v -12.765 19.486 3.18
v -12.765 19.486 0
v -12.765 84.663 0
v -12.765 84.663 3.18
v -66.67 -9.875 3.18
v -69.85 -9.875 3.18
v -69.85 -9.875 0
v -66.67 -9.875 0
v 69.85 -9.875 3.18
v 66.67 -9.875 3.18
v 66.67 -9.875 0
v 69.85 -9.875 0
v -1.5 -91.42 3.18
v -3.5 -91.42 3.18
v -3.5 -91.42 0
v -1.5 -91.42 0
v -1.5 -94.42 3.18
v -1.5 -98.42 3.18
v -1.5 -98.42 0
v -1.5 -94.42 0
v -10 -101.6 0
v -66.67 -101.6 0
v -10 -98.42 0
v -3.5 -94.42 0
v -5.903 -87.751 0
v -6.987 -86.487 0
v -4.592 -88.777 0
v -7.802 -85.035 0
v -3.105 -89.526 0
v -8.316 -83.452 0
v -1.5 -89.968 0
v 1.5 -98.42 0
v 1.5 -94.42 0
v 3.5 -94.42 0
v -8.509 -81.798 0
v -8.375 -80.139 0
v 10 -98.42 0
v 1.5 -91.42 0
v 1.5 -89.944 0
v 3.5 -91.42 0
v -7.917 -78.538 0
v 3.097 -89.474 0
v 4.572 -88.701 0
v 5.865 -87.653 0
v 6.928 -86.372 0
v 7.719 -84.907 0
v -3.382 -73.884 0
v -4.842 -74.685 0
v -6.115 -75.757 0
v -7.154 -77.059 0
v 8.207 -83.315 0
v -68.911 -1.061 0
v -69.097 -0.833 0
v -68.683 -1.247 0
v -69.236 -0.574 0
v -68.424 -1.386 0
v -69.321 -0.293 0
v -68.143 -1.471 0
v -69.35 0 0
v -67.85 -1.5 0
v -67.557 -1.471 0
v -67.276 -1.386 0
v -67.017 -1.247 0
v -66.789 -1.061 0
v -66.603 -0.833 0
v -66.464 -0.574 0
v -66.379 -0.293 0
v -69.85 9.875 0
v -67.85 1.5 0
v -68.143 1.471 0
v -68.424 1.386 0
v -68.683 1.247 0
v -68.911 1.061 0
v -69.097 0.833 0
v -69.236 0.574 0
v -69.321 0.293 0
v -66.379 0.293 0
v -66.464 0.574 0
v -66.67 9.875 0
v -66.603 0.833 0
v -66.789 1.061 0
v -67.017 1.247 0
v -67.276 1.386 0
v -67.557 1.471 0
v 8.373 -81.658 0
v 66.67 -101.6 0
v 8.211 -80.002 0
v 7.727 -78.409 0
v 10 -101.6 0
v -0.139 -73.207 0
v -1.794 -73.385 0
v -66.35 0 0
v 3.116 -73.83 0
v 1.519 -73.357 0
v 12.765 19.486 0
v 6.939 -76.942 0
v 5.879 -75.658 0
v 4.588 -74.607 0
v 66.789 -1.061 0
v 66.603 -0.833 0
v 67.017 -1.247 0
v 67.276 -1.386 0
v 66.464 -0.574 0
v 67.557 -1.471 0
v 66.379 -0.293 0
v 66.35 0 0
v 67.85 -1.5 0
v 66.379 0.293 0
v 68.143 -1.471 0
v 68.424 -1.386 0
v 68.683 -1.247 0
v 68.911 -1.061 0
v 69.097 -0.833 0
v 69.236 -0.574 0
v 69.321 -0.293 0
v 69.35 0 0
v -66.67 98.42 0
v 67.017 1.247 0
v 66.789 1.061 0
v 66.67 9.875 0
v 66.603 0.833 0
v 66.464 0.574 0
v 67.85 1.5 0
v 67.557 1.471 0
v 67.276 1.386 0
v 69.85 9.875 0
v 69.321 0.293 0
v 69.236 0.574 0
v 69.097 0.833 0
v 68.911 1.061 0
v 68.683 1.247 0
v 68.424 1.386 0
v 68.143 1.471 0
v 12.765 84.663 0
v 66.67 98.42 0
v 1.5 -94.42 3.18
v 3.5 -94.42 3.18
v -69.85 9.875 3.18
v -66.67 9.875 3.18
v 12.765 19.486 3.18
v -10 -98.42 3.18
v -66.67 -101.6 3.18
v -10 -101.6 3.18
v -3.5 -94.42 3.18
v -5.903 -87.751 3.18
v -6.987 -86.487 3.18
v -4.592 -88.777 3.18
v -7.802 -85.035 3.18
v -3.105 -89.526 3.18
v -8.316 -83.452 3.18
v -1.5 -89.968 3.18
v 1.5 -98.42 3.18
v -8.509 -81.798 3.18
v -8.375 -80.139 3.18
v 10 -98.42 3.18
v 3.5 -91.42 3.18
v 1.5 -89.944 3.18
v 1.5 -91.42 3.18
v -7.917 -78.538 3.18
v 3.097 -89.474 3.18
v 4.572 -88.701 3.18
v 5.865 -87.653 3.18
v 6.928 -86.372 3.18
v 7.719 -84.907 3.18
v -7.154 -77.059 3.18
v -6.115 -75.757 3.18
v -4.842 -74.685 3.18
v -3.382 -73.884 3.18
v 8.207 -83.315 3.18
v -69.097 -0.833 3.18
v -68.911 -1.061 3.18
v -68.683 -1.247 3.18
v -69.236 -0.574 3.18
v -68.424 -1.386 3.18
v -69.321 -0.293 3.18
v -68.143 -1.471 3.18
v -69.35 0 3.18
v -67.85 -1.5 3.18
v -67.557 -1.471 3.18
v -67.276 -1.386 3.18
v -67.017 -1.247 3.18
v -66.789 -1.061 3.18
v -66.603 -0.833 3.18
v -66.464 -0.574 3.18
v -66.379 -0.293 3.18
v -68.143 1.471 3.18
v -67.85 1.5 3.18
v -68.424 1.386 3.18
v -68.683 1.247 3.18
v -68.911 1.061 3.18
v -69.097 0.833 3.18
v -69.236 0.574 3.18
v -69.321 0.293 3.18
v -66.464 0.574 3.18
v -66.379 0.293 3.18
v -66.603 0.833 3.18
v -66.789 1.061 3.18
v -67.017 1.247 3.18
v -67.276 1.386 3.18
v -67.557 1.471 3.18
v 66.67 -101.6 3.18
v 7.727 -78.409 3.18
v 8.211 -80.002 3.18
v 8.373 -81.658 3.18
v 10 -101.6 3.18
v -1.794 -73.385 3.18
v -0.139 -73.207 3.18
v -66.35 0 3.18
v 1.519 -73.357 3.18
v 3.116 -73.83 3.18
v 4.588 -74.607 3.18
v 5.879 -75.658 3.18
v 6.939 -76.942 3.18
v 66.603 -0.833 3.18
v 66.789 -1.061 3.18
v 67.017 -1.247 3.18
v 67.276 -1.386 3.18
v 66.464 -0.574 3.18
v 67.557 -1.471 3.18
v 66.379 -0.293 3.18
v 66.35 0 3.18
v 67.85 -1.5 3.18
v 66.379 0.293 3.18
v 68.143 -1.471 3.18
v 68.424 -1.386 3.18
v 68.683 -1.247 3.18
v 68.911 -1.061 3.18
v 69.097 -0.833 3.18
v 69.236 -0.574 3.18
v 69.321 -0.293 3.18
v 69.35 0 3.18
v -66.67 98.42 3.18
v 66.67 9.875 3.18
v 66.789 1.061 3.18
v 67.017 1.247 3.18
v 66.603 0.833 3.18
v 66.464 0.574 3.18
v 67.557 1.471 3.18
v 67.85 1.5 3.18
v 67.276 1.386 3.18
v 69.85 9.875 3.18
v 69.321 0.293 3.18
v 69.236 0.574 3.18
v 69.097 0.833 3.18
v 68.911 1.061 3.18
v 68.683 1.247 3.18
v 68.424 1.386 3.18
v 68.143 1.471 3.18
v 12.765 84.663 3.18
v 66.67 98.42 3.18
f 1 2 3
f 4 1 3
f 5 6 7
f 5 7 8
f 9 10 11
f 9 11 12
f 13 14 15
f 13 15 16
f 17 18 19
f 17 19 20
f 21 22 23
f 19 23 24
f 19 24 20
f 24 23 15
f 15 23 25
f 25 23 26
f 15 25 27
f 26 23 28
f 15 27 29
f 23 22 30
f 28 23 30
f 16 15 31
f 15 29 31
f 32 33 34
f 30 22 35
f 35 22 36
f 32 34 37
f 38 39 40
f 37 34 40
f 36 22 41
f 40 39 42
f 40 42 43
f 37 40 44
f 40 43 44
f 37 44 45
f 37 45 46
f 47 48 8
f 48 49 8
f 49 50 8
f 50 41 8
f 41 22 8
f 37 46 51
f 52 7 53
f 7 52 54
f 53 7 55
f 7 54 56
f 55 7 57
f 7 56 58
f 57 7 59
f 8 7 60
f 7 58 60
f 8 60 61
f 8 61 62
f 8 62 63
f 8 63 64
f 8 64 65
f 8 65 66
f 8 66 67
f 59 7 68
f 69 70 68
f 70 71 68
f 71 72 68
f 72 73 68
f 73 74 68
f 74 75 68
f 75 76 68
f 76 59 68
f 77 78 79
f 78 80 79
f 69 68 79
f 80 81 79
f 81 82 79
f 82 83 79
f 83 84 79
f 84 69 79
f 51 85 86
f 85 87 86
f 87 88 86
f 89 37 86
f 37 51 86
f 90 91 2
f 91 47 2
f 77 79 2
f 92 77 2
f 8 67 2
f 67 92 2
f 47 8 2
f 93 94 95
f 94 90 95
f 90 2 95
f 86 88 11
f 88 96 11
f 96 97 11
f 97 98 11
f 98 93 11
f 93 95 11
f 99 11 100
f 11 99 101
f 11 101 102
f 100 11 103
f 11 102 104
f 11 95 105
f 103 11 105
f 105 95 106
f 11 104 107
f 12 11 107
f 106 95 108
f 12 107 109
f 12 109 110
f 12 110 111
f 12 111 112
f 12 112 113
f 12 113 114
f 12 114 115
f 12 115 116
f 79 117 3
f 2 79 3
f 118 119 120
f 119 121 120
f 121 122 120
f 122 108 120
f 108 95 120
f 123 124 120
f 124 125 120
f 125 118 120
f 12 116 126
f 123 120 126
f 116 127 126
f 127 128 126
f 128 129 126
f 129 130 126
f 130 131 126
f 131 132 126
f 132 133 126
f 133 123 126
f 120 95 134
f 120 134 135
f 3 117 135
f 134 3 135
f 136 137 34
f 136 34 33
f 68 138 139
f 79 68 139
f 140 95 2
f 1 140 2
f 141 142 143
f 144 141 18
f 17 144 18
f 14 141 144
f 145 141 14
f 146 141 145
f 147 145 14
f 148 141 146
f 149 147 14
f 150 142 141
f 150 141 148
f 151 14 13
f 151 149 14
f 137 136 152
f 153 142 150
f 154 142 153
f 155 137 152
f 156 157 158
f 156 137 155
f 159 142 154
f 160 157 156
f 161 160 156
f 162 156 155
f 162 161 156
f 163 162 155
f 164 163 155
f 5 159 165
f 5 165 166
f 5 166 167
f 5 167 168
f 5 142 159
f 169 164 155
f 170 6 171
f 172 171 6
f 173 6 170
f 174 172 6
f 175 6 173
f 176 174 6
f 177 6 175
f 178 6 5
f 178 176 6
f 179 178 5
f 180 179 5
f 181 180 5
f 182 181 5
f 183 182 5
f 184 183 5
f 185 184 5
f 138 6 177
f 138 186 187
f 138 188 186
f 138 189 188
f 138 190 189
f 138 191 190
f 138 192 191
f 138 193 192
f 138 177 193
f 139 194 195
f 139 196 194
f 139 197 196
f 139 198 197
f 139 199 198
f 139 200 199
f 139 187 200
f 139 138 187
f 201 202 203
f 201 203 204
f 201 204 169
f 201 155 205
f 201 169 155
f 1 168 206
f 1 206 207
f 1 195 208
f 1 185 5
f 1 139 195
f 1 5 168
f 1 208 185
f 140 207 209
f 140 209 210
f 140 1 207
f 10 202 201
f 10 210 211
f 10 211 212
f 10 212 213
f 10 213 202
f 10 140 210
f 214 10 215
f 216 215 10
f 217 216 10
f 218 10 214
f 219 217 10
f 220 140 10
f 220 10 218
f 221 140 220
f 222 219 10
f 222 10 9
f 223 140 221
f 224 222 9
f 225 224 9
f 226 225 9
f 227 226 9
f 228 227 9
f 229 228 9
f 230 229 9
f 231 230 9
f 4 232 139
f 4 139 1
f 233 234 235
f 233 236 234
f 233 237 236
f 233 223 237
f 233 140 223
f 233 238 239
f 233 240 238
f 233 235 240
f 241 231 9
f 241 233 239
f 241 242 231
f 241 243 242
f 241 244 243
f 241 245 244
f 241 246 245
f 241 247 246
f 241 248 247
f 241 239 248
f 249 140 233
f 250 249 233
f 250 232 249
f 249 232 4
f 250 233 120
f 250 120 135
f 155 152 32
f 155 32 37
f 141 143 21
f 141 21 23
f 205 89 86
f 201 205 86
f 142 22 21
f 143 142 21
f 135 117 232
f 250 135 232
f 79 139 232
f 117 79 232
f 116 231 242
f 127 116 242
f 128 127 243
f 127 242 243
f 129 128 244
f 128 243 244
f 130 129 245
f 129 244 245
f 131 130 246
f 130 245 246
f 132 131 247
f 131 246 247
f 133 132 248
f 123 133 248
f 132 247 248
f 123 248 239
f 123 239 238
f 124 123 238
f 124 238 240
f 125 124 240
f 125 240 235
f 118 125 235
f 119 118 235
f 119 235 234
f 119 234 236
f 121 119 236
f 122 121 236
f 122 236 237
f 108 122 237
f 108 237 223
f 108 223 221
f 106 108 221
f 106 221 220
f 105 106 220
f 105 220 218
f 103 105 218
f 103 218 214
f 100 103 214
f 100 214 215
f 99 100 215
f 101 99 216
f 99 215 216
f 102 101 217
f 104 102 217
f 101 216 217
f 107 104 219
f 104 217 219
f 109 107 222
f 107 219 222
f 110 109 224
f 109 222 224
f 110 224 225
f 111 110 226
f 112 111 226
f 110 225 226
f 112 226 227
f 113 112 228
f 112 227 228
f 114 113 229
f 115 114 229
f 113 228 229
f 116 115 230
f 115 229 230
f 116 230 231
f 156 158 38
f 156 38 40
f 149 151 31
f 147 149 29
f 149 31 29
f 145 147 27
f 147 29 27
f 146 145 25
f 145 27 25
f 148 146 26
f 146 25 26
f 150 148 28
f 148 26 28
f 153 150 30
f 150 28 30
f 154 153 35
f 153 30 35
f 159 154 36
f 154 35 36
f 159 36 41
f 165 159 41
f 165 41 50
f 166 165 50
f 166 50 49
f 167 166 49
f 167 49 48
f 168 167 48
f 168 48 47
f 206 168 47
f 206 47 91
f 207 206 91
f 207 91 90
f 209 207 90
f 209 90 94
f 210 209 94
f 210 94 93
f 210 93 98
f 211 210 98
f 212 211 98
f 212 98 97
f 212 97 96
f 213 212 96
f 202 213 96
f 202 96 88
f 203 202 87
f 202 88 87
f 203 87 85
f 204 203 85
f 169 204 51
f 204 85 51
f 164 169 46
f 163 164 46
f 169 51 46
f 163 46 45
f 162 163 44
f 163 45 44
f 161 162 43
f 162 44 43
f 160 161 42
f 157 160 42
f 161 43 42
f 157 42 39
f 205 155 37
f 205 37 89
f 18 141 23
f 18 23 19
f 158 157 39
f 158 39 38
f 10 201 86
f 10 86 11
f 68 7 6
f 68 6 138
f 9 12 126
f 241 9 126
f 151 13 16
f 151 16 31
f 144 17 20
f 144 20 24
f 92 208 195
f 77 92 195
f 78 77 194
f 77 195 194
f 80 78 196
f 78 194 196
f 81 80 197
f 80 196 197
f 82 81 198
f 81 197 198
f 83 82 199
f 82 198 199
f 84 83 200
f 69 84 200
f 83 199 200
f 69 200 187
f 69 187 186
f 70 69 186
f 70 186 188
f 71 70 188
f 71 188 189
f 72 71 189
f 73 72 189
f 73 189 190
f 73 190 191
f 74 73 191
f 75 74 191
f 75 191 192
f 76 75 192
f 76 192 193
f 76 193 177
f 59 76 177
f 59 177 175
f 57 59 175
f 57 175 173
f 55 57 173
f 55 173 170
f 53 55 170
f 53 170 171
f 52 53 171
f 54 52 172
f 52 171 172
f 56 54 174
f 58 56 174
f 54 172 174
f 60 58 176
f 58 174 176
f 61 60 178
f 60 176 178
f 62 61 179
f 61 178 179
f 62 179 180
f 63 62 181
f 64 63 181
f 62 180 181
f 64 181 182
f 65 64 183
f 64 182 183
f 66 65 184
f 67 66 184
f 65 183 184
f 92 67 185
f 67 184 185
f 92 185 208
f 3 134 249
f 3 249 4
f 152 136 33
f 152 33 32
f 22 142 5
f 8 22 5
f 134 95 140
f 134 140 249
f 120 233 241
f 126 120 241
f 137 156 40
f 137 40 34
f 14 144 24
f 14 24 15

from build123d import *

# Parameters (mm, degrees)
SKETCH1_W           = 139.7
SKETCH1_H           = 203.2
BOSS_EXTRUDE1_DEPTH = 3.18
SKETCH2_R           = 1.5
SKETCH2_W           = 3.18
SKETCH2_H           = 91.725
CUT_EXTRUDE1_DEPTH  = 4.18
SKETCH3_R           = 8.441994665
CUT_EXTRUDE2_DEPTH  = 10
SKETCH5_W           = 25.530623926
SKETCH5_H           = 65.176444071
CUT_EXTRUDE3_DEPTH  = 10
SKETCH6_W           = 20.542742003
SKETCH6_H           = 14.404591712
BOSS_EXTRUDE2_DEPTH = 3.18
SKETCH7_W           = 56.63400571
SKETCH7_H           = 3.18
SKETCH7_W_2         = 56.95599429
CUT_EXTRUDE4_DEPTH  = 3.18
SKETCH8_W           = 3.18
SKETCH8_H           = 3.18
CUT_EXTRUDE5_DEPTH  = 80.56400571


with BuildPart() as part:
    # Sketch1 → Boss-Extrude1 (new body)
    with BuildSketch(Plane.XY):
        Rectangle(SKETCH1_W, SKETCH1_H)
    extrude(amount=BOSS_EXTRUDE1_DEPTH)

    # Sketch2 → Cut-Extrude1 (cut, through all)
    with BuildSketch(Plane.XY.offset(3.18)):
        with Locations((-67.85, 0)):
            Circle(SKETCH2_R)
        with Locations((67.85, 0)):
            Circle(SKETCH2_R)
        Polygon((-10, 101.6), (10, 101.6), (10, 98.42), (1.5, 98.42), (1.5, 94.42), (3.5, 94.42), (3.5, 91.42), (1.5, 91.42), (1.5, 88.42), (-1.5, 88.42), (-1.5, 91.42), (-3.5, 91.42), (-3.5, 94.42), (-1.5, 94.42), (-1.5, 98.42), (-10, 98.42), align=None)
        Polygon((-10, -101.6), (-10, -98.42), (-1.5, -98.42), (-1.5, -94.42), (-3.5, -94.42), (-3.5, -91.42), (-1.5, -91.42), (-1.5, -88.42), (1.5, -88.42), (1.5, -91.42), (3.5, -91.42), (3.5, -94.42), (1.5, -94.42), (1.5, -98.42), (10, -98.42), (10, -101.6), align=None)
        with Locations((-68.26, 55.7375)):
            Rectangle(SKETCH2_W, SKETCH2_H)
        with Locations((-68.26, -55.7375)):
            Rectangle(SKETCH2_W, SKETCH2_H)
        with Locations((68.26, -55.7375)):
            Rectangle(SKETCH2_W, SKETCH2_H)
        with Locations((68.26, 55.7375)):
            Rectangle(SKETCH2_W, SKETCH2_H)
    extrude(amount=-CUT_EXTRUDE1_DEPTH, mode=Mode.SUBTRACT)

    # Sketch3 → Cut-Extrude2 (cut)
    with BuildSketch(Plane(origin=(0, 0, 0), x_dir=(-1, 0, 0), z_dir=(0, 0, -1))):
        with Locations((0.068813102, -81.648638462)):
            Circle(SKETCH3_R)
    extrude(amount=-CUT_EXTRUDE2_DEPTH, mode=Mode.SUBTRACT)

    # Sketch5 → Cut-Extrude3 (cut)
    with BuildSketch(Plane(origin=(0, 0, 0), x_dir=(-1, 0, 0), z_dir=(0, 0, -1))):
        with Locations((0, 52.074409839)):
            Rectangle(SKETCH5_W, SKETCH5_H)
    extrude(amount=-CUT_EXTRUDE3_DEPTH, mode=Mode.SUBTRACT)

    # Sketch6 → Boss-Extrude2 (add)
    with BuildSketch(Plane(origin=(0, 0, 0), x_dir=(-1, 0, 0), z_dir=(0, 0, -1))):
        with Locations((0.271371002, 94.397704144)):
            Rectangle(SKETCH6_W, SKETCH6_H)
    extrude(amount=-BOSS_EXTRUDE2_DEPTH)

    # Sketch7 → Cut-Extrude4 (cut)
    with BuildSketch(Plane(origin=(0, 0, 0), x_dir=(-1, 0, 0), z_dir=(0, 0, -1))):
        with Locations((-38.352997145, 100.01)):
            Rectangle(SKETCH7_W, SKETCH7_H)
        with Locations((38.192002855, 100.01)):
            Rectangle(SKETCH7_W_2, SKETCH7_H)
    extrude(amount=-CUT_EXTRUDE4_DEPTH, mode=Mode.SUBTRACT)

    # Sketch8 → Cut-Extrude5 (cut, through all)
    with BuildSketch(Plane.ZY.offset(9.71400571)):
        with Locations((1.59, 100.01)):
            Rectangle(SKETCH8_W, SKETCH8_H)
    extrude(amount=-CUT_EXTRUDE5_DEPTH, mode=Mode.SUBTRACT)


solid = part.part
